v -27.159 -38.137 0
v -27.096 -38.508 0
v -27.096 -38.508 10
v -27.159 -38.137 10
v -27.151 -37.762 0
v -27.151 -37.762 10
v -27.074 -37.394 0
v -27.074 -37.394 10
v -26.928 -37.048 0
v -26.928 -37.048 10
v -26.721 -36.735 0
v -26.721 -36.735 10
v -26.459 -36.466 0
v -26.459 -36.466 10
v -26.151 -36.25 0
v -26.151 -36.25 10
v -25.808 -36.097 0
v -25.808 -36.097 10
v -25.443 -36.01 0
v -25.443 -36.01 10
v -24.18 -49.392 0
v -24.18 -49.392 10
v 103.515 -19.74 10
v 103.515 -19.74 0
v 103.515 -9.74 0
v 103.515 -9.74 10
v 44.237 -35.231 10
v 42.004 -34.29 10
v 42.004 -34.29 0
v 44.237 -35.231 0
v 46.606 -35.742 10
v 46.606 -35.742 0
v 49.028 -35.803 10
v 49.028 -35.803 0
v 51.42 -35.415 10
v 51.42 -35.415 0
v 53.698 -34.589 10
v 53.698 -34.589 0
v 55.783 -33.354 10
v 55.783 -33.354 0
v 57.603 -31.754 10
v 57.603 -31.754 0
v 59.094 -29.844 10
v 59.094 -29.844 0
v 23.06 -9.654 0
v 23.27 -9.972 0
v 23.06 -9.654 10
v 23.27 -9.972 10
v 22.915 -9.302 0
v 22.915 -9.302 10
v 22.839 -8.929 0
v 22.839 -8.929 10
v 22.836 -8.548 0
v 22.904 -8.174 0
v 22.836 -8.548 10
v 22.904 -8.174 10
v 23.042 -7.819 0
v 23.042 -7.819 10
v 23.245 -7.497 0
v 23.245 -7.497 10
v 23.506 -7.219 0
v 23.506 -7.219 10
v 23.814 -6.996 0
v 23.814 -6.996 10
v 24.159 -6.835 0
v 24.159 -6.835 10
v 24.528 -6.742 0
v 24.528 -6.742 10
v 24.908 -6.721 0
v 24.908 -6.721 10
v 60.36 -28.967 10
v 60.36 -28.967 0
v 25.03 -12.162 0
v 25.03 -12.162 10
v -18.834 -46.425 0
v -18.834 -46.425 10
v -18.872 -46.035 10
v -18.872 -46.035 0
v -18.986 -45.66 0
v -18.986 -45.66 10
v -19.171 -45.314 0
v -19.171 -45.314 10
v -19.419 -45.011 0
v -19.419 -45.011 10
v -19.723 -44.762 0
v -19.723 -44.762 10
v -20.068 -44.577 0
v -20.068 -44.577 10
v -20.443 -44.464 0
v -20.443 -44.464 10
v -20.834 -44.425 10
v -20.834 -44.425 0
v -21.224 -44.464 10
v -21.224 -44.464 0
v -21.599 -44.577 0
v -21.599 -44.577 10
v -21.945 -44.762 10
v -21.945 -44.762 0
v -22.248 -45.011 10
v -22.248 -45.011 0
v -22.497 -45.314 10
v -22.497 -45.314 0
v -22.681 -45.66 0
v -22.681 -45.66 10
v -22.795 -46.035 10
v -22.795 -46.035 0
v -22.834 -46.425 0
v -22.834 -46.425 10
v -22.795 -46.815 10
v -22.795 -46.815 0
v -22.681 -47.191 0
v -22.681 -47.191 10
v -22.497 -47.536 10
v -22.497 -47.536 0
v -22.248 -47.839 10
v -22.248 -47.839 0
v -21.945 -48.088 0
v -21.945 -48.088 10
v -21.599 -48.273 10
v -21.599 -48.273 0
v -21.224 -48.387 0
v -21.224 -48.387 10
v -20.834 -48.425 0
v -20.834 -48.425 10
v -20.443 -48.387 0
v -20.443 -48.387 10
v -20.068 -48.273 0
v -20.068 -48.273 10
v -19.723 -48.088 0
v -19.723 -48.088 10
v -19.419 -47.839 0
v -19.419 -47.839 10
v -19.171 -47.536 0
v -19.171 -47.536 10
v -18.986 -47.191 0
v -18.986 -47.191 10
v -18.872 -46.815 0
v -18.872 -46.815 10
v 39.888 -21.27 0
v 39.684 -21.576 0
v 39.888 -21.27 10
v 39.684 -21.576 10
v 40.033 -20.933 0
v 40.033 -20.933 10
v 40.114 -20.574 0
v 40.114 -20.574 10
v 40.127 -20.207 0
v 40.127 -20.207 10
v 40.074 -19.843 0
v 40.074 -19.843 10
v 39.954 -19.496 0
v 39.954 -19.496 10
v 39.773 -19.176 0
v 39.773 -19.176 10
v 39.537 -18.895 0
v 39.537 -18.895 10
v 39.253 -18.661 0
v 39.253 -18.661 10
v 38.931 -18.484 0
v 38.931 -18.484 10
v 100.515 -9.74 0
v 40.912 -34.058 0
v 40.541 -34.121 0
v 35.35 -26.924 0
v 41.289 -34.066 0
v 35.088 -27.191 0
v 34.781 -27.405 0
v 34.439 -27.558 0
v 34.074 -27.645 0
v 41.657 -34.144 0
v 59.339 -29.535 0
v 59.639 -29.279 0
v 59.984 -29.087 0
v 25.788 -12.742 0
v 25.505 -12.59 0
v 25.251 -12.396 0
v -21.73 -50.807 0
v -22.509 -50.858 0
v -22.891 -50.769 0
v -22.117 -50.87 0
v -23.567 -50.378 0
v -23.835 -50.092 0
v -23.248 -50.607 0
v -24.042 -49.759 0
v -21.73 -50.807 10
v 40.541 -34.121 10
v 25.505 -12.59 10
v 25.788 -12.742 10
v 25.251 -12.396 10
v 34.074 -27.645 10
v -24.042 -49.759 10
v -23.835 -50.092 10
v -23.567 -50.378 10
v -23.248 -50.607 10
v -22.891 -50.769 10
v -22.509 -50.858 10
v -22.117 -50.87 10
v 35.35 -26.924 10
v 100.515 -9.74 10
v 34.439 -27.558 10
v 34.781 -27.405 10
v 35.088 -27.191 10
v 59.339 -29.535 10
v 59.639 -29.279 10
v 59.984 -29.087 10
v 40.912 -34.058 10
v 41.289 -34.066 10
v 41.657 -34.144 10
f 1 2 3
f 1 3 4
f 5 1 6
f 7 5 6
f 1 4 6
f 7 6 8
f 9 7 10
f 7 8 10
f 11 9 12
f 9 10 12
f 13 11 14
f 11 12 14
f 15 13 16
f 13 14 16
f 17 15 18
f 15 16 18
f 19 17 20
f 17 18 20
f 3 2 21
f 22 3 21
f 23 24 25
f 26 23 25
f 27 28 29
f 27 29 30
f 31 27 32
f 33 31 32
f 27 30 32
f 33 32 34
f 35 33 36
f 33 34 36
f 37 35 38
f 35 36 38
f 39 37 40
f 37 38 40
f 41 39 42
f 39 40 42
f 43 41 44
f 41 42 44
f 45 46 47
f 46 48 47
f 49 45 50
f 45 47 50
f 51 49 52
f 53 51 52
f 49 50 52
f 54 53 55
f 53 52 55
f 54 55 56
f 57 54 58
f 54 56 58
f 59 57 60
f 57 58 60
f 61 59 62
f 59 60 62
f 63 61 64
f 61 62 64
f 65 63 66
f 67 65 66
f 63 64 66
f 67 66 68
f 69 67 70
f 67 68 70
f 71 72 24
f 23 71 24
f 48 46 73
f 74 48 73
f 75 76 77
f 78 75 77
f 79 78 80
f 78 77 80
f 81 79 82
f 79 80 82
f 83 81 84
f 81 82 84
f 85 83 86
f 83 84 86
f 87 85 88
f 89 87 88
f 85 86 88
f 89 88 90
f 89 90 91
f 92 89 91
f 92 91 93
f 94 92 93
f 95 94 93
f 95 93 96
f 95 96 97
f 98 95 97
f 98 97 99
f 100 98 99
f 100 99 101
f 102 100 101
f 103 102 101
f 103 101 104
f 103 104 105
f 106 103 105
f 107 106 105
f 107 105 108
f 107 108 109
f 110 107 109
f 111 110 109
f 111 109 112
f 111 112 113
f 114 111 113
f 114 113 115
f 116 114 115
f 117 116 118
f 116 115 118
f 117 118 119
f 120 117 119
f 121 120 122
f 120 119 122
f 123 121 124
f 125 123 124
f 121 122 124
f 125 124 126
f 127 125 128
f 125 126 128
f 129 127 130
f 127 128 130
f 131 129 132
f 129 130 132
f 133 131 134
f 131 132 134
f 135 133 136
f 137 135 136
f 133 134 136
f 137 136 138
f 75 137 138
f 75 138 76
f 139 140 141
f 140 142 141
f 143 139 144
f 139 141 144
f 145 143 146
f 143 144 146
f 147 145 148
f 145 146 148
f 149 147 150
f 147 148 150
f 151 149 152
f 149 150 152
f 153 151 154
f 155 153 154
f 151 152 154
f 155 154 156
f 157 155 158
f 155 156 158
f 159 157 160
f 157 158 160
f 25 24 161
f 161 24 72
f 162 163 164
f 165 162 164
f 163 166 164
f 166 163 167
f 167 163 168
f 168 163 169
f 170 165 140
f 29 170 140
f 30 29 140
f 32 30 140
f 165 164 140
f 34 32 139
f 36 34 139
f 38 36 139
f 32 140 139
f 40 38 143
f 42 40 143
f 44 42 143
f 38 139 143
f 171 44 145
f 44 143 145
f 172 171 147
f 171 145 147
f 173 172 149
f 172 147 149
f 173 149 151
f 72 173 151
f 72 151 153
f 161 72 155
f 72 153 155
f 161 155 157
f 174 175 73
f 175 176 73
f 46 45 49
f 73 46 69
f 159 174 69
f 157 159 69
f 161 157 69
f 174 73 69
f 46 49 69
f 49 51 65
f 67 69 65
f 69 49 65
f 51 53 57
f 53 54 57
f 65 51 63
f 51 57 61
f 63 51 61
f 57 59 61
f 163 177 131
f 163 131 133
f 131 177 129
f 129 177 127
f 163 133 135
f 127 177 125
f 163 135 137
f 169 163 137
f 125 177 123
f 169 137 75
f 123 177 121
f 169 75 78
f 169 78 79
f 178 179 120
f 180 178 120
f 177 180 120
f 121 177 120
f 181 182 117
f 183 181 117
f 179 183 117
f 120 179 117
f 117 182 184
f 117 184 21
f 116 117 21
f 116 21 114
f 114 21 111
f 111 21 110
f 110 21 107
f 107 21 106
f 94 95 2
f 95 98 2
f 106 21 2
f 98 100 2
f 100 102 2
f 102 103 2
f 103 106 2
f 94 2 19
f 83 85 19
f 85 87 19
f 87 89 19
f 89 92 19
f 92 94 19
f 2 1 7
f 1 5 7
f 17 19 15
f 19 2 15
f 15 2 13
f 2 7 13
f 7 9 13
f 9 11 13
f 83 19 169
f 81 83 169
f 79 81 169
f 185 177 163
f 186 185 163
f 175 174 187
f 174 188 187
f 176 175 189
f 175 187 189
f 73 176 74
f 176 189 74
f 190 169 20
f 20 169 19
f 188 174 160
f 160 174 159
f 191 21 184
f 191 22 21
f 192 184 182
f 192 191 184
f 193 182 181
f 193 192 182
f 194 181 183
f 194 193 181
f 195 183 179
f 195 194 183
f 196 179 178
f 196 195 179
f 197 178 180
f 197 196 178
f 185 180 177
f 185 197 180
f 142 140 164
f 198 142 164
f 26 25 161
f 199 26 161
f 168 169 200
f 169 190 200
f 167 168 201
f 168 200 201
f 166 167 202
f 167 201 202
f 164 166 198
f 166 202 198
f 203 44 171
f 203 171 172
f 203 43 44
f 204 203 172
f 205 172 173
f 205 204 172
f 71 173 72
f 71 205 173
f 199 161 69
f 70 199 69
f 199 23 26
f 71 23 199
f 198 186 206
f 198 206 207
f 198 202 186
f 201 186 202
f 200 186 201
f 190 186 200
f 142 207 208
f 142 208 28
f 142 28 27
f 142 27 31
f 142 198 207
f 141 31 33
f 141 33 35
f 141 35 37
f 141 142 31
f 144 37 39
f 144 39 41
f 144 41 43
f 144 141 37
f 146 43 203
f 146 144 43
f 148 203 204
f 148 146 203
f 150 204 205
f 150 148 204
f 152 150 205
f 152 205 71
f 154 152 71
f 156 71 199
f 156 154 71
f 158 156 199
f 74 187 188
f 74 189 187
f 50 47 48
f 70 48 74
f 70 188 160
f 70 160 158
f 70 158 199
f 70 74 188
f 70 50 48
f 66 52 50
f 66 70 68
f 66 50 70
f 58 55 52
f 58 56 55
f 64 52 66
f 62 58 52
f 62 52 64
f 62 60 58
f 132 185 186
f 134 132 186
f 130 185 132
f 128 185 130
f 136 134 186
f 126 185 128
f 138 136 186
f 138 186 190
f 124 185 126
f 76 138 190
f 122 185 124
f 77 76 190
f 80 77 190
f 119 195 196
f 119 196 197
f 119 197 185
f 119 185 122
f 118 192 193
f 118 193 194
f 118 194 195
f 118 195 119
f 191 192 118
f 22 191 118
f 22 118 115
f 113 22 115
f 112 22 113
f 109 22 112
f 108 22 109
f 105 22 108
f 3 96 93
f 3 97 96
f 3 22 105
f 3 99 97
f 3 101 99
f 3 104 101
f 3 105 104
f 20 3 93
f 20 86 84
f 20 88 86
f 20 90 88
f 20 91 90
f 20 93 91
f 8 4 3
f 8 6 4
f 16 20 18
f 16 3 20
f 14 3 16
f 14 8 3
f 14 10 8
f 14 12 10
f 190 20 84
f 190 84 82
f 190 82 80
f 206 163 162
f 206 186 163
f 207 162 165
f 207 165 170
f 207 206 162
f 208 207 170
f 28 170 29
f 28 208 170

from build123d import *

# Parameters (mm, degrees)
BOSS_EXTRUDE1_DEPTH = 10
SKETCH2_R           = 2
CUT_EXTRUDE1_DEPTH  = 116.971936943
FILLET1_R           = 2


with BuildPart() as part:
    # Sketch1 → Boss-Extrude1 (new body)
    with BuildSketch(Plane(origin=(0, 0, 0), x_dir=(0, 1, 0), z_dir=(0, 0, 1))):
        with BuildLine():
            Line((-36.324229872, 27.68131099), (-51.324229872, 23.662073103))
            Line((-51.324229872, 23.662073103), (-33.907532364, -41.337926897))
            ThreePointArc((-33.907532364, -41.337926897), (-35.409341514, -51.440004773), (-29.149202114, -59.509581147))
            Line((-29.149202114, -59.509581147), (-19.739589339, -103.514798876))
            Line((-19.739589339, -103.514798876), (-9.739589339, -103.514798876))
            Line((-9.739589339, -103.514798876), (-9.739589339, -100.514798876))
            Line((-9.739589339, -100.514798876), (-6.545356821, -20.514798876))
            Line((-6.545356821, -20.514798876), (-12.545356821, -25.337926897))
            Line((-12.545356821, -25.337926897), (-19.535457388, -41.337926897))
            Line((-19.535457388, -41.337926897), (-27.535457388, -34.854054639))
            Line((-27.535457388, -34.854054639), (-36.324229872, 27.68131099))
        make_face()
    extrude(amount=BOSS_EXTRUDE1_DEPTH)

    # Sketch2 → Cut-Extrude1 (cut, through all)
    with BuildSketch(Plane.XY.offset(10)):
        with Locations((-20.833645978, -46.425250386)):
            Circle(SKETCH2_R)
    extrude(amount=-CUT_EXTRUDE1_DEPTH, mode=Mode.SUBTRACT)

    # Fillet1
    fillet1_edges = [part.edges().sort_by_distance(p)[0] for p in [
        (59.509581147, -29.149202114, 5),
        (41.337926897, -33.907532364, 5),
        (-23.662073103, -51.324229872, 5),
        (-27.68131099, -36.324229872, 5),
        (34.854054639, -27.535457388, 5),
        (41.337926897, -19.535457388, 5),
        (25.337926897, -12.545356821, 5),
        (20.514798876, -6.545356821, 5),
    ]]
    fillet(fillet1_edges, radius=FILLET1_R)


solid = part.part
